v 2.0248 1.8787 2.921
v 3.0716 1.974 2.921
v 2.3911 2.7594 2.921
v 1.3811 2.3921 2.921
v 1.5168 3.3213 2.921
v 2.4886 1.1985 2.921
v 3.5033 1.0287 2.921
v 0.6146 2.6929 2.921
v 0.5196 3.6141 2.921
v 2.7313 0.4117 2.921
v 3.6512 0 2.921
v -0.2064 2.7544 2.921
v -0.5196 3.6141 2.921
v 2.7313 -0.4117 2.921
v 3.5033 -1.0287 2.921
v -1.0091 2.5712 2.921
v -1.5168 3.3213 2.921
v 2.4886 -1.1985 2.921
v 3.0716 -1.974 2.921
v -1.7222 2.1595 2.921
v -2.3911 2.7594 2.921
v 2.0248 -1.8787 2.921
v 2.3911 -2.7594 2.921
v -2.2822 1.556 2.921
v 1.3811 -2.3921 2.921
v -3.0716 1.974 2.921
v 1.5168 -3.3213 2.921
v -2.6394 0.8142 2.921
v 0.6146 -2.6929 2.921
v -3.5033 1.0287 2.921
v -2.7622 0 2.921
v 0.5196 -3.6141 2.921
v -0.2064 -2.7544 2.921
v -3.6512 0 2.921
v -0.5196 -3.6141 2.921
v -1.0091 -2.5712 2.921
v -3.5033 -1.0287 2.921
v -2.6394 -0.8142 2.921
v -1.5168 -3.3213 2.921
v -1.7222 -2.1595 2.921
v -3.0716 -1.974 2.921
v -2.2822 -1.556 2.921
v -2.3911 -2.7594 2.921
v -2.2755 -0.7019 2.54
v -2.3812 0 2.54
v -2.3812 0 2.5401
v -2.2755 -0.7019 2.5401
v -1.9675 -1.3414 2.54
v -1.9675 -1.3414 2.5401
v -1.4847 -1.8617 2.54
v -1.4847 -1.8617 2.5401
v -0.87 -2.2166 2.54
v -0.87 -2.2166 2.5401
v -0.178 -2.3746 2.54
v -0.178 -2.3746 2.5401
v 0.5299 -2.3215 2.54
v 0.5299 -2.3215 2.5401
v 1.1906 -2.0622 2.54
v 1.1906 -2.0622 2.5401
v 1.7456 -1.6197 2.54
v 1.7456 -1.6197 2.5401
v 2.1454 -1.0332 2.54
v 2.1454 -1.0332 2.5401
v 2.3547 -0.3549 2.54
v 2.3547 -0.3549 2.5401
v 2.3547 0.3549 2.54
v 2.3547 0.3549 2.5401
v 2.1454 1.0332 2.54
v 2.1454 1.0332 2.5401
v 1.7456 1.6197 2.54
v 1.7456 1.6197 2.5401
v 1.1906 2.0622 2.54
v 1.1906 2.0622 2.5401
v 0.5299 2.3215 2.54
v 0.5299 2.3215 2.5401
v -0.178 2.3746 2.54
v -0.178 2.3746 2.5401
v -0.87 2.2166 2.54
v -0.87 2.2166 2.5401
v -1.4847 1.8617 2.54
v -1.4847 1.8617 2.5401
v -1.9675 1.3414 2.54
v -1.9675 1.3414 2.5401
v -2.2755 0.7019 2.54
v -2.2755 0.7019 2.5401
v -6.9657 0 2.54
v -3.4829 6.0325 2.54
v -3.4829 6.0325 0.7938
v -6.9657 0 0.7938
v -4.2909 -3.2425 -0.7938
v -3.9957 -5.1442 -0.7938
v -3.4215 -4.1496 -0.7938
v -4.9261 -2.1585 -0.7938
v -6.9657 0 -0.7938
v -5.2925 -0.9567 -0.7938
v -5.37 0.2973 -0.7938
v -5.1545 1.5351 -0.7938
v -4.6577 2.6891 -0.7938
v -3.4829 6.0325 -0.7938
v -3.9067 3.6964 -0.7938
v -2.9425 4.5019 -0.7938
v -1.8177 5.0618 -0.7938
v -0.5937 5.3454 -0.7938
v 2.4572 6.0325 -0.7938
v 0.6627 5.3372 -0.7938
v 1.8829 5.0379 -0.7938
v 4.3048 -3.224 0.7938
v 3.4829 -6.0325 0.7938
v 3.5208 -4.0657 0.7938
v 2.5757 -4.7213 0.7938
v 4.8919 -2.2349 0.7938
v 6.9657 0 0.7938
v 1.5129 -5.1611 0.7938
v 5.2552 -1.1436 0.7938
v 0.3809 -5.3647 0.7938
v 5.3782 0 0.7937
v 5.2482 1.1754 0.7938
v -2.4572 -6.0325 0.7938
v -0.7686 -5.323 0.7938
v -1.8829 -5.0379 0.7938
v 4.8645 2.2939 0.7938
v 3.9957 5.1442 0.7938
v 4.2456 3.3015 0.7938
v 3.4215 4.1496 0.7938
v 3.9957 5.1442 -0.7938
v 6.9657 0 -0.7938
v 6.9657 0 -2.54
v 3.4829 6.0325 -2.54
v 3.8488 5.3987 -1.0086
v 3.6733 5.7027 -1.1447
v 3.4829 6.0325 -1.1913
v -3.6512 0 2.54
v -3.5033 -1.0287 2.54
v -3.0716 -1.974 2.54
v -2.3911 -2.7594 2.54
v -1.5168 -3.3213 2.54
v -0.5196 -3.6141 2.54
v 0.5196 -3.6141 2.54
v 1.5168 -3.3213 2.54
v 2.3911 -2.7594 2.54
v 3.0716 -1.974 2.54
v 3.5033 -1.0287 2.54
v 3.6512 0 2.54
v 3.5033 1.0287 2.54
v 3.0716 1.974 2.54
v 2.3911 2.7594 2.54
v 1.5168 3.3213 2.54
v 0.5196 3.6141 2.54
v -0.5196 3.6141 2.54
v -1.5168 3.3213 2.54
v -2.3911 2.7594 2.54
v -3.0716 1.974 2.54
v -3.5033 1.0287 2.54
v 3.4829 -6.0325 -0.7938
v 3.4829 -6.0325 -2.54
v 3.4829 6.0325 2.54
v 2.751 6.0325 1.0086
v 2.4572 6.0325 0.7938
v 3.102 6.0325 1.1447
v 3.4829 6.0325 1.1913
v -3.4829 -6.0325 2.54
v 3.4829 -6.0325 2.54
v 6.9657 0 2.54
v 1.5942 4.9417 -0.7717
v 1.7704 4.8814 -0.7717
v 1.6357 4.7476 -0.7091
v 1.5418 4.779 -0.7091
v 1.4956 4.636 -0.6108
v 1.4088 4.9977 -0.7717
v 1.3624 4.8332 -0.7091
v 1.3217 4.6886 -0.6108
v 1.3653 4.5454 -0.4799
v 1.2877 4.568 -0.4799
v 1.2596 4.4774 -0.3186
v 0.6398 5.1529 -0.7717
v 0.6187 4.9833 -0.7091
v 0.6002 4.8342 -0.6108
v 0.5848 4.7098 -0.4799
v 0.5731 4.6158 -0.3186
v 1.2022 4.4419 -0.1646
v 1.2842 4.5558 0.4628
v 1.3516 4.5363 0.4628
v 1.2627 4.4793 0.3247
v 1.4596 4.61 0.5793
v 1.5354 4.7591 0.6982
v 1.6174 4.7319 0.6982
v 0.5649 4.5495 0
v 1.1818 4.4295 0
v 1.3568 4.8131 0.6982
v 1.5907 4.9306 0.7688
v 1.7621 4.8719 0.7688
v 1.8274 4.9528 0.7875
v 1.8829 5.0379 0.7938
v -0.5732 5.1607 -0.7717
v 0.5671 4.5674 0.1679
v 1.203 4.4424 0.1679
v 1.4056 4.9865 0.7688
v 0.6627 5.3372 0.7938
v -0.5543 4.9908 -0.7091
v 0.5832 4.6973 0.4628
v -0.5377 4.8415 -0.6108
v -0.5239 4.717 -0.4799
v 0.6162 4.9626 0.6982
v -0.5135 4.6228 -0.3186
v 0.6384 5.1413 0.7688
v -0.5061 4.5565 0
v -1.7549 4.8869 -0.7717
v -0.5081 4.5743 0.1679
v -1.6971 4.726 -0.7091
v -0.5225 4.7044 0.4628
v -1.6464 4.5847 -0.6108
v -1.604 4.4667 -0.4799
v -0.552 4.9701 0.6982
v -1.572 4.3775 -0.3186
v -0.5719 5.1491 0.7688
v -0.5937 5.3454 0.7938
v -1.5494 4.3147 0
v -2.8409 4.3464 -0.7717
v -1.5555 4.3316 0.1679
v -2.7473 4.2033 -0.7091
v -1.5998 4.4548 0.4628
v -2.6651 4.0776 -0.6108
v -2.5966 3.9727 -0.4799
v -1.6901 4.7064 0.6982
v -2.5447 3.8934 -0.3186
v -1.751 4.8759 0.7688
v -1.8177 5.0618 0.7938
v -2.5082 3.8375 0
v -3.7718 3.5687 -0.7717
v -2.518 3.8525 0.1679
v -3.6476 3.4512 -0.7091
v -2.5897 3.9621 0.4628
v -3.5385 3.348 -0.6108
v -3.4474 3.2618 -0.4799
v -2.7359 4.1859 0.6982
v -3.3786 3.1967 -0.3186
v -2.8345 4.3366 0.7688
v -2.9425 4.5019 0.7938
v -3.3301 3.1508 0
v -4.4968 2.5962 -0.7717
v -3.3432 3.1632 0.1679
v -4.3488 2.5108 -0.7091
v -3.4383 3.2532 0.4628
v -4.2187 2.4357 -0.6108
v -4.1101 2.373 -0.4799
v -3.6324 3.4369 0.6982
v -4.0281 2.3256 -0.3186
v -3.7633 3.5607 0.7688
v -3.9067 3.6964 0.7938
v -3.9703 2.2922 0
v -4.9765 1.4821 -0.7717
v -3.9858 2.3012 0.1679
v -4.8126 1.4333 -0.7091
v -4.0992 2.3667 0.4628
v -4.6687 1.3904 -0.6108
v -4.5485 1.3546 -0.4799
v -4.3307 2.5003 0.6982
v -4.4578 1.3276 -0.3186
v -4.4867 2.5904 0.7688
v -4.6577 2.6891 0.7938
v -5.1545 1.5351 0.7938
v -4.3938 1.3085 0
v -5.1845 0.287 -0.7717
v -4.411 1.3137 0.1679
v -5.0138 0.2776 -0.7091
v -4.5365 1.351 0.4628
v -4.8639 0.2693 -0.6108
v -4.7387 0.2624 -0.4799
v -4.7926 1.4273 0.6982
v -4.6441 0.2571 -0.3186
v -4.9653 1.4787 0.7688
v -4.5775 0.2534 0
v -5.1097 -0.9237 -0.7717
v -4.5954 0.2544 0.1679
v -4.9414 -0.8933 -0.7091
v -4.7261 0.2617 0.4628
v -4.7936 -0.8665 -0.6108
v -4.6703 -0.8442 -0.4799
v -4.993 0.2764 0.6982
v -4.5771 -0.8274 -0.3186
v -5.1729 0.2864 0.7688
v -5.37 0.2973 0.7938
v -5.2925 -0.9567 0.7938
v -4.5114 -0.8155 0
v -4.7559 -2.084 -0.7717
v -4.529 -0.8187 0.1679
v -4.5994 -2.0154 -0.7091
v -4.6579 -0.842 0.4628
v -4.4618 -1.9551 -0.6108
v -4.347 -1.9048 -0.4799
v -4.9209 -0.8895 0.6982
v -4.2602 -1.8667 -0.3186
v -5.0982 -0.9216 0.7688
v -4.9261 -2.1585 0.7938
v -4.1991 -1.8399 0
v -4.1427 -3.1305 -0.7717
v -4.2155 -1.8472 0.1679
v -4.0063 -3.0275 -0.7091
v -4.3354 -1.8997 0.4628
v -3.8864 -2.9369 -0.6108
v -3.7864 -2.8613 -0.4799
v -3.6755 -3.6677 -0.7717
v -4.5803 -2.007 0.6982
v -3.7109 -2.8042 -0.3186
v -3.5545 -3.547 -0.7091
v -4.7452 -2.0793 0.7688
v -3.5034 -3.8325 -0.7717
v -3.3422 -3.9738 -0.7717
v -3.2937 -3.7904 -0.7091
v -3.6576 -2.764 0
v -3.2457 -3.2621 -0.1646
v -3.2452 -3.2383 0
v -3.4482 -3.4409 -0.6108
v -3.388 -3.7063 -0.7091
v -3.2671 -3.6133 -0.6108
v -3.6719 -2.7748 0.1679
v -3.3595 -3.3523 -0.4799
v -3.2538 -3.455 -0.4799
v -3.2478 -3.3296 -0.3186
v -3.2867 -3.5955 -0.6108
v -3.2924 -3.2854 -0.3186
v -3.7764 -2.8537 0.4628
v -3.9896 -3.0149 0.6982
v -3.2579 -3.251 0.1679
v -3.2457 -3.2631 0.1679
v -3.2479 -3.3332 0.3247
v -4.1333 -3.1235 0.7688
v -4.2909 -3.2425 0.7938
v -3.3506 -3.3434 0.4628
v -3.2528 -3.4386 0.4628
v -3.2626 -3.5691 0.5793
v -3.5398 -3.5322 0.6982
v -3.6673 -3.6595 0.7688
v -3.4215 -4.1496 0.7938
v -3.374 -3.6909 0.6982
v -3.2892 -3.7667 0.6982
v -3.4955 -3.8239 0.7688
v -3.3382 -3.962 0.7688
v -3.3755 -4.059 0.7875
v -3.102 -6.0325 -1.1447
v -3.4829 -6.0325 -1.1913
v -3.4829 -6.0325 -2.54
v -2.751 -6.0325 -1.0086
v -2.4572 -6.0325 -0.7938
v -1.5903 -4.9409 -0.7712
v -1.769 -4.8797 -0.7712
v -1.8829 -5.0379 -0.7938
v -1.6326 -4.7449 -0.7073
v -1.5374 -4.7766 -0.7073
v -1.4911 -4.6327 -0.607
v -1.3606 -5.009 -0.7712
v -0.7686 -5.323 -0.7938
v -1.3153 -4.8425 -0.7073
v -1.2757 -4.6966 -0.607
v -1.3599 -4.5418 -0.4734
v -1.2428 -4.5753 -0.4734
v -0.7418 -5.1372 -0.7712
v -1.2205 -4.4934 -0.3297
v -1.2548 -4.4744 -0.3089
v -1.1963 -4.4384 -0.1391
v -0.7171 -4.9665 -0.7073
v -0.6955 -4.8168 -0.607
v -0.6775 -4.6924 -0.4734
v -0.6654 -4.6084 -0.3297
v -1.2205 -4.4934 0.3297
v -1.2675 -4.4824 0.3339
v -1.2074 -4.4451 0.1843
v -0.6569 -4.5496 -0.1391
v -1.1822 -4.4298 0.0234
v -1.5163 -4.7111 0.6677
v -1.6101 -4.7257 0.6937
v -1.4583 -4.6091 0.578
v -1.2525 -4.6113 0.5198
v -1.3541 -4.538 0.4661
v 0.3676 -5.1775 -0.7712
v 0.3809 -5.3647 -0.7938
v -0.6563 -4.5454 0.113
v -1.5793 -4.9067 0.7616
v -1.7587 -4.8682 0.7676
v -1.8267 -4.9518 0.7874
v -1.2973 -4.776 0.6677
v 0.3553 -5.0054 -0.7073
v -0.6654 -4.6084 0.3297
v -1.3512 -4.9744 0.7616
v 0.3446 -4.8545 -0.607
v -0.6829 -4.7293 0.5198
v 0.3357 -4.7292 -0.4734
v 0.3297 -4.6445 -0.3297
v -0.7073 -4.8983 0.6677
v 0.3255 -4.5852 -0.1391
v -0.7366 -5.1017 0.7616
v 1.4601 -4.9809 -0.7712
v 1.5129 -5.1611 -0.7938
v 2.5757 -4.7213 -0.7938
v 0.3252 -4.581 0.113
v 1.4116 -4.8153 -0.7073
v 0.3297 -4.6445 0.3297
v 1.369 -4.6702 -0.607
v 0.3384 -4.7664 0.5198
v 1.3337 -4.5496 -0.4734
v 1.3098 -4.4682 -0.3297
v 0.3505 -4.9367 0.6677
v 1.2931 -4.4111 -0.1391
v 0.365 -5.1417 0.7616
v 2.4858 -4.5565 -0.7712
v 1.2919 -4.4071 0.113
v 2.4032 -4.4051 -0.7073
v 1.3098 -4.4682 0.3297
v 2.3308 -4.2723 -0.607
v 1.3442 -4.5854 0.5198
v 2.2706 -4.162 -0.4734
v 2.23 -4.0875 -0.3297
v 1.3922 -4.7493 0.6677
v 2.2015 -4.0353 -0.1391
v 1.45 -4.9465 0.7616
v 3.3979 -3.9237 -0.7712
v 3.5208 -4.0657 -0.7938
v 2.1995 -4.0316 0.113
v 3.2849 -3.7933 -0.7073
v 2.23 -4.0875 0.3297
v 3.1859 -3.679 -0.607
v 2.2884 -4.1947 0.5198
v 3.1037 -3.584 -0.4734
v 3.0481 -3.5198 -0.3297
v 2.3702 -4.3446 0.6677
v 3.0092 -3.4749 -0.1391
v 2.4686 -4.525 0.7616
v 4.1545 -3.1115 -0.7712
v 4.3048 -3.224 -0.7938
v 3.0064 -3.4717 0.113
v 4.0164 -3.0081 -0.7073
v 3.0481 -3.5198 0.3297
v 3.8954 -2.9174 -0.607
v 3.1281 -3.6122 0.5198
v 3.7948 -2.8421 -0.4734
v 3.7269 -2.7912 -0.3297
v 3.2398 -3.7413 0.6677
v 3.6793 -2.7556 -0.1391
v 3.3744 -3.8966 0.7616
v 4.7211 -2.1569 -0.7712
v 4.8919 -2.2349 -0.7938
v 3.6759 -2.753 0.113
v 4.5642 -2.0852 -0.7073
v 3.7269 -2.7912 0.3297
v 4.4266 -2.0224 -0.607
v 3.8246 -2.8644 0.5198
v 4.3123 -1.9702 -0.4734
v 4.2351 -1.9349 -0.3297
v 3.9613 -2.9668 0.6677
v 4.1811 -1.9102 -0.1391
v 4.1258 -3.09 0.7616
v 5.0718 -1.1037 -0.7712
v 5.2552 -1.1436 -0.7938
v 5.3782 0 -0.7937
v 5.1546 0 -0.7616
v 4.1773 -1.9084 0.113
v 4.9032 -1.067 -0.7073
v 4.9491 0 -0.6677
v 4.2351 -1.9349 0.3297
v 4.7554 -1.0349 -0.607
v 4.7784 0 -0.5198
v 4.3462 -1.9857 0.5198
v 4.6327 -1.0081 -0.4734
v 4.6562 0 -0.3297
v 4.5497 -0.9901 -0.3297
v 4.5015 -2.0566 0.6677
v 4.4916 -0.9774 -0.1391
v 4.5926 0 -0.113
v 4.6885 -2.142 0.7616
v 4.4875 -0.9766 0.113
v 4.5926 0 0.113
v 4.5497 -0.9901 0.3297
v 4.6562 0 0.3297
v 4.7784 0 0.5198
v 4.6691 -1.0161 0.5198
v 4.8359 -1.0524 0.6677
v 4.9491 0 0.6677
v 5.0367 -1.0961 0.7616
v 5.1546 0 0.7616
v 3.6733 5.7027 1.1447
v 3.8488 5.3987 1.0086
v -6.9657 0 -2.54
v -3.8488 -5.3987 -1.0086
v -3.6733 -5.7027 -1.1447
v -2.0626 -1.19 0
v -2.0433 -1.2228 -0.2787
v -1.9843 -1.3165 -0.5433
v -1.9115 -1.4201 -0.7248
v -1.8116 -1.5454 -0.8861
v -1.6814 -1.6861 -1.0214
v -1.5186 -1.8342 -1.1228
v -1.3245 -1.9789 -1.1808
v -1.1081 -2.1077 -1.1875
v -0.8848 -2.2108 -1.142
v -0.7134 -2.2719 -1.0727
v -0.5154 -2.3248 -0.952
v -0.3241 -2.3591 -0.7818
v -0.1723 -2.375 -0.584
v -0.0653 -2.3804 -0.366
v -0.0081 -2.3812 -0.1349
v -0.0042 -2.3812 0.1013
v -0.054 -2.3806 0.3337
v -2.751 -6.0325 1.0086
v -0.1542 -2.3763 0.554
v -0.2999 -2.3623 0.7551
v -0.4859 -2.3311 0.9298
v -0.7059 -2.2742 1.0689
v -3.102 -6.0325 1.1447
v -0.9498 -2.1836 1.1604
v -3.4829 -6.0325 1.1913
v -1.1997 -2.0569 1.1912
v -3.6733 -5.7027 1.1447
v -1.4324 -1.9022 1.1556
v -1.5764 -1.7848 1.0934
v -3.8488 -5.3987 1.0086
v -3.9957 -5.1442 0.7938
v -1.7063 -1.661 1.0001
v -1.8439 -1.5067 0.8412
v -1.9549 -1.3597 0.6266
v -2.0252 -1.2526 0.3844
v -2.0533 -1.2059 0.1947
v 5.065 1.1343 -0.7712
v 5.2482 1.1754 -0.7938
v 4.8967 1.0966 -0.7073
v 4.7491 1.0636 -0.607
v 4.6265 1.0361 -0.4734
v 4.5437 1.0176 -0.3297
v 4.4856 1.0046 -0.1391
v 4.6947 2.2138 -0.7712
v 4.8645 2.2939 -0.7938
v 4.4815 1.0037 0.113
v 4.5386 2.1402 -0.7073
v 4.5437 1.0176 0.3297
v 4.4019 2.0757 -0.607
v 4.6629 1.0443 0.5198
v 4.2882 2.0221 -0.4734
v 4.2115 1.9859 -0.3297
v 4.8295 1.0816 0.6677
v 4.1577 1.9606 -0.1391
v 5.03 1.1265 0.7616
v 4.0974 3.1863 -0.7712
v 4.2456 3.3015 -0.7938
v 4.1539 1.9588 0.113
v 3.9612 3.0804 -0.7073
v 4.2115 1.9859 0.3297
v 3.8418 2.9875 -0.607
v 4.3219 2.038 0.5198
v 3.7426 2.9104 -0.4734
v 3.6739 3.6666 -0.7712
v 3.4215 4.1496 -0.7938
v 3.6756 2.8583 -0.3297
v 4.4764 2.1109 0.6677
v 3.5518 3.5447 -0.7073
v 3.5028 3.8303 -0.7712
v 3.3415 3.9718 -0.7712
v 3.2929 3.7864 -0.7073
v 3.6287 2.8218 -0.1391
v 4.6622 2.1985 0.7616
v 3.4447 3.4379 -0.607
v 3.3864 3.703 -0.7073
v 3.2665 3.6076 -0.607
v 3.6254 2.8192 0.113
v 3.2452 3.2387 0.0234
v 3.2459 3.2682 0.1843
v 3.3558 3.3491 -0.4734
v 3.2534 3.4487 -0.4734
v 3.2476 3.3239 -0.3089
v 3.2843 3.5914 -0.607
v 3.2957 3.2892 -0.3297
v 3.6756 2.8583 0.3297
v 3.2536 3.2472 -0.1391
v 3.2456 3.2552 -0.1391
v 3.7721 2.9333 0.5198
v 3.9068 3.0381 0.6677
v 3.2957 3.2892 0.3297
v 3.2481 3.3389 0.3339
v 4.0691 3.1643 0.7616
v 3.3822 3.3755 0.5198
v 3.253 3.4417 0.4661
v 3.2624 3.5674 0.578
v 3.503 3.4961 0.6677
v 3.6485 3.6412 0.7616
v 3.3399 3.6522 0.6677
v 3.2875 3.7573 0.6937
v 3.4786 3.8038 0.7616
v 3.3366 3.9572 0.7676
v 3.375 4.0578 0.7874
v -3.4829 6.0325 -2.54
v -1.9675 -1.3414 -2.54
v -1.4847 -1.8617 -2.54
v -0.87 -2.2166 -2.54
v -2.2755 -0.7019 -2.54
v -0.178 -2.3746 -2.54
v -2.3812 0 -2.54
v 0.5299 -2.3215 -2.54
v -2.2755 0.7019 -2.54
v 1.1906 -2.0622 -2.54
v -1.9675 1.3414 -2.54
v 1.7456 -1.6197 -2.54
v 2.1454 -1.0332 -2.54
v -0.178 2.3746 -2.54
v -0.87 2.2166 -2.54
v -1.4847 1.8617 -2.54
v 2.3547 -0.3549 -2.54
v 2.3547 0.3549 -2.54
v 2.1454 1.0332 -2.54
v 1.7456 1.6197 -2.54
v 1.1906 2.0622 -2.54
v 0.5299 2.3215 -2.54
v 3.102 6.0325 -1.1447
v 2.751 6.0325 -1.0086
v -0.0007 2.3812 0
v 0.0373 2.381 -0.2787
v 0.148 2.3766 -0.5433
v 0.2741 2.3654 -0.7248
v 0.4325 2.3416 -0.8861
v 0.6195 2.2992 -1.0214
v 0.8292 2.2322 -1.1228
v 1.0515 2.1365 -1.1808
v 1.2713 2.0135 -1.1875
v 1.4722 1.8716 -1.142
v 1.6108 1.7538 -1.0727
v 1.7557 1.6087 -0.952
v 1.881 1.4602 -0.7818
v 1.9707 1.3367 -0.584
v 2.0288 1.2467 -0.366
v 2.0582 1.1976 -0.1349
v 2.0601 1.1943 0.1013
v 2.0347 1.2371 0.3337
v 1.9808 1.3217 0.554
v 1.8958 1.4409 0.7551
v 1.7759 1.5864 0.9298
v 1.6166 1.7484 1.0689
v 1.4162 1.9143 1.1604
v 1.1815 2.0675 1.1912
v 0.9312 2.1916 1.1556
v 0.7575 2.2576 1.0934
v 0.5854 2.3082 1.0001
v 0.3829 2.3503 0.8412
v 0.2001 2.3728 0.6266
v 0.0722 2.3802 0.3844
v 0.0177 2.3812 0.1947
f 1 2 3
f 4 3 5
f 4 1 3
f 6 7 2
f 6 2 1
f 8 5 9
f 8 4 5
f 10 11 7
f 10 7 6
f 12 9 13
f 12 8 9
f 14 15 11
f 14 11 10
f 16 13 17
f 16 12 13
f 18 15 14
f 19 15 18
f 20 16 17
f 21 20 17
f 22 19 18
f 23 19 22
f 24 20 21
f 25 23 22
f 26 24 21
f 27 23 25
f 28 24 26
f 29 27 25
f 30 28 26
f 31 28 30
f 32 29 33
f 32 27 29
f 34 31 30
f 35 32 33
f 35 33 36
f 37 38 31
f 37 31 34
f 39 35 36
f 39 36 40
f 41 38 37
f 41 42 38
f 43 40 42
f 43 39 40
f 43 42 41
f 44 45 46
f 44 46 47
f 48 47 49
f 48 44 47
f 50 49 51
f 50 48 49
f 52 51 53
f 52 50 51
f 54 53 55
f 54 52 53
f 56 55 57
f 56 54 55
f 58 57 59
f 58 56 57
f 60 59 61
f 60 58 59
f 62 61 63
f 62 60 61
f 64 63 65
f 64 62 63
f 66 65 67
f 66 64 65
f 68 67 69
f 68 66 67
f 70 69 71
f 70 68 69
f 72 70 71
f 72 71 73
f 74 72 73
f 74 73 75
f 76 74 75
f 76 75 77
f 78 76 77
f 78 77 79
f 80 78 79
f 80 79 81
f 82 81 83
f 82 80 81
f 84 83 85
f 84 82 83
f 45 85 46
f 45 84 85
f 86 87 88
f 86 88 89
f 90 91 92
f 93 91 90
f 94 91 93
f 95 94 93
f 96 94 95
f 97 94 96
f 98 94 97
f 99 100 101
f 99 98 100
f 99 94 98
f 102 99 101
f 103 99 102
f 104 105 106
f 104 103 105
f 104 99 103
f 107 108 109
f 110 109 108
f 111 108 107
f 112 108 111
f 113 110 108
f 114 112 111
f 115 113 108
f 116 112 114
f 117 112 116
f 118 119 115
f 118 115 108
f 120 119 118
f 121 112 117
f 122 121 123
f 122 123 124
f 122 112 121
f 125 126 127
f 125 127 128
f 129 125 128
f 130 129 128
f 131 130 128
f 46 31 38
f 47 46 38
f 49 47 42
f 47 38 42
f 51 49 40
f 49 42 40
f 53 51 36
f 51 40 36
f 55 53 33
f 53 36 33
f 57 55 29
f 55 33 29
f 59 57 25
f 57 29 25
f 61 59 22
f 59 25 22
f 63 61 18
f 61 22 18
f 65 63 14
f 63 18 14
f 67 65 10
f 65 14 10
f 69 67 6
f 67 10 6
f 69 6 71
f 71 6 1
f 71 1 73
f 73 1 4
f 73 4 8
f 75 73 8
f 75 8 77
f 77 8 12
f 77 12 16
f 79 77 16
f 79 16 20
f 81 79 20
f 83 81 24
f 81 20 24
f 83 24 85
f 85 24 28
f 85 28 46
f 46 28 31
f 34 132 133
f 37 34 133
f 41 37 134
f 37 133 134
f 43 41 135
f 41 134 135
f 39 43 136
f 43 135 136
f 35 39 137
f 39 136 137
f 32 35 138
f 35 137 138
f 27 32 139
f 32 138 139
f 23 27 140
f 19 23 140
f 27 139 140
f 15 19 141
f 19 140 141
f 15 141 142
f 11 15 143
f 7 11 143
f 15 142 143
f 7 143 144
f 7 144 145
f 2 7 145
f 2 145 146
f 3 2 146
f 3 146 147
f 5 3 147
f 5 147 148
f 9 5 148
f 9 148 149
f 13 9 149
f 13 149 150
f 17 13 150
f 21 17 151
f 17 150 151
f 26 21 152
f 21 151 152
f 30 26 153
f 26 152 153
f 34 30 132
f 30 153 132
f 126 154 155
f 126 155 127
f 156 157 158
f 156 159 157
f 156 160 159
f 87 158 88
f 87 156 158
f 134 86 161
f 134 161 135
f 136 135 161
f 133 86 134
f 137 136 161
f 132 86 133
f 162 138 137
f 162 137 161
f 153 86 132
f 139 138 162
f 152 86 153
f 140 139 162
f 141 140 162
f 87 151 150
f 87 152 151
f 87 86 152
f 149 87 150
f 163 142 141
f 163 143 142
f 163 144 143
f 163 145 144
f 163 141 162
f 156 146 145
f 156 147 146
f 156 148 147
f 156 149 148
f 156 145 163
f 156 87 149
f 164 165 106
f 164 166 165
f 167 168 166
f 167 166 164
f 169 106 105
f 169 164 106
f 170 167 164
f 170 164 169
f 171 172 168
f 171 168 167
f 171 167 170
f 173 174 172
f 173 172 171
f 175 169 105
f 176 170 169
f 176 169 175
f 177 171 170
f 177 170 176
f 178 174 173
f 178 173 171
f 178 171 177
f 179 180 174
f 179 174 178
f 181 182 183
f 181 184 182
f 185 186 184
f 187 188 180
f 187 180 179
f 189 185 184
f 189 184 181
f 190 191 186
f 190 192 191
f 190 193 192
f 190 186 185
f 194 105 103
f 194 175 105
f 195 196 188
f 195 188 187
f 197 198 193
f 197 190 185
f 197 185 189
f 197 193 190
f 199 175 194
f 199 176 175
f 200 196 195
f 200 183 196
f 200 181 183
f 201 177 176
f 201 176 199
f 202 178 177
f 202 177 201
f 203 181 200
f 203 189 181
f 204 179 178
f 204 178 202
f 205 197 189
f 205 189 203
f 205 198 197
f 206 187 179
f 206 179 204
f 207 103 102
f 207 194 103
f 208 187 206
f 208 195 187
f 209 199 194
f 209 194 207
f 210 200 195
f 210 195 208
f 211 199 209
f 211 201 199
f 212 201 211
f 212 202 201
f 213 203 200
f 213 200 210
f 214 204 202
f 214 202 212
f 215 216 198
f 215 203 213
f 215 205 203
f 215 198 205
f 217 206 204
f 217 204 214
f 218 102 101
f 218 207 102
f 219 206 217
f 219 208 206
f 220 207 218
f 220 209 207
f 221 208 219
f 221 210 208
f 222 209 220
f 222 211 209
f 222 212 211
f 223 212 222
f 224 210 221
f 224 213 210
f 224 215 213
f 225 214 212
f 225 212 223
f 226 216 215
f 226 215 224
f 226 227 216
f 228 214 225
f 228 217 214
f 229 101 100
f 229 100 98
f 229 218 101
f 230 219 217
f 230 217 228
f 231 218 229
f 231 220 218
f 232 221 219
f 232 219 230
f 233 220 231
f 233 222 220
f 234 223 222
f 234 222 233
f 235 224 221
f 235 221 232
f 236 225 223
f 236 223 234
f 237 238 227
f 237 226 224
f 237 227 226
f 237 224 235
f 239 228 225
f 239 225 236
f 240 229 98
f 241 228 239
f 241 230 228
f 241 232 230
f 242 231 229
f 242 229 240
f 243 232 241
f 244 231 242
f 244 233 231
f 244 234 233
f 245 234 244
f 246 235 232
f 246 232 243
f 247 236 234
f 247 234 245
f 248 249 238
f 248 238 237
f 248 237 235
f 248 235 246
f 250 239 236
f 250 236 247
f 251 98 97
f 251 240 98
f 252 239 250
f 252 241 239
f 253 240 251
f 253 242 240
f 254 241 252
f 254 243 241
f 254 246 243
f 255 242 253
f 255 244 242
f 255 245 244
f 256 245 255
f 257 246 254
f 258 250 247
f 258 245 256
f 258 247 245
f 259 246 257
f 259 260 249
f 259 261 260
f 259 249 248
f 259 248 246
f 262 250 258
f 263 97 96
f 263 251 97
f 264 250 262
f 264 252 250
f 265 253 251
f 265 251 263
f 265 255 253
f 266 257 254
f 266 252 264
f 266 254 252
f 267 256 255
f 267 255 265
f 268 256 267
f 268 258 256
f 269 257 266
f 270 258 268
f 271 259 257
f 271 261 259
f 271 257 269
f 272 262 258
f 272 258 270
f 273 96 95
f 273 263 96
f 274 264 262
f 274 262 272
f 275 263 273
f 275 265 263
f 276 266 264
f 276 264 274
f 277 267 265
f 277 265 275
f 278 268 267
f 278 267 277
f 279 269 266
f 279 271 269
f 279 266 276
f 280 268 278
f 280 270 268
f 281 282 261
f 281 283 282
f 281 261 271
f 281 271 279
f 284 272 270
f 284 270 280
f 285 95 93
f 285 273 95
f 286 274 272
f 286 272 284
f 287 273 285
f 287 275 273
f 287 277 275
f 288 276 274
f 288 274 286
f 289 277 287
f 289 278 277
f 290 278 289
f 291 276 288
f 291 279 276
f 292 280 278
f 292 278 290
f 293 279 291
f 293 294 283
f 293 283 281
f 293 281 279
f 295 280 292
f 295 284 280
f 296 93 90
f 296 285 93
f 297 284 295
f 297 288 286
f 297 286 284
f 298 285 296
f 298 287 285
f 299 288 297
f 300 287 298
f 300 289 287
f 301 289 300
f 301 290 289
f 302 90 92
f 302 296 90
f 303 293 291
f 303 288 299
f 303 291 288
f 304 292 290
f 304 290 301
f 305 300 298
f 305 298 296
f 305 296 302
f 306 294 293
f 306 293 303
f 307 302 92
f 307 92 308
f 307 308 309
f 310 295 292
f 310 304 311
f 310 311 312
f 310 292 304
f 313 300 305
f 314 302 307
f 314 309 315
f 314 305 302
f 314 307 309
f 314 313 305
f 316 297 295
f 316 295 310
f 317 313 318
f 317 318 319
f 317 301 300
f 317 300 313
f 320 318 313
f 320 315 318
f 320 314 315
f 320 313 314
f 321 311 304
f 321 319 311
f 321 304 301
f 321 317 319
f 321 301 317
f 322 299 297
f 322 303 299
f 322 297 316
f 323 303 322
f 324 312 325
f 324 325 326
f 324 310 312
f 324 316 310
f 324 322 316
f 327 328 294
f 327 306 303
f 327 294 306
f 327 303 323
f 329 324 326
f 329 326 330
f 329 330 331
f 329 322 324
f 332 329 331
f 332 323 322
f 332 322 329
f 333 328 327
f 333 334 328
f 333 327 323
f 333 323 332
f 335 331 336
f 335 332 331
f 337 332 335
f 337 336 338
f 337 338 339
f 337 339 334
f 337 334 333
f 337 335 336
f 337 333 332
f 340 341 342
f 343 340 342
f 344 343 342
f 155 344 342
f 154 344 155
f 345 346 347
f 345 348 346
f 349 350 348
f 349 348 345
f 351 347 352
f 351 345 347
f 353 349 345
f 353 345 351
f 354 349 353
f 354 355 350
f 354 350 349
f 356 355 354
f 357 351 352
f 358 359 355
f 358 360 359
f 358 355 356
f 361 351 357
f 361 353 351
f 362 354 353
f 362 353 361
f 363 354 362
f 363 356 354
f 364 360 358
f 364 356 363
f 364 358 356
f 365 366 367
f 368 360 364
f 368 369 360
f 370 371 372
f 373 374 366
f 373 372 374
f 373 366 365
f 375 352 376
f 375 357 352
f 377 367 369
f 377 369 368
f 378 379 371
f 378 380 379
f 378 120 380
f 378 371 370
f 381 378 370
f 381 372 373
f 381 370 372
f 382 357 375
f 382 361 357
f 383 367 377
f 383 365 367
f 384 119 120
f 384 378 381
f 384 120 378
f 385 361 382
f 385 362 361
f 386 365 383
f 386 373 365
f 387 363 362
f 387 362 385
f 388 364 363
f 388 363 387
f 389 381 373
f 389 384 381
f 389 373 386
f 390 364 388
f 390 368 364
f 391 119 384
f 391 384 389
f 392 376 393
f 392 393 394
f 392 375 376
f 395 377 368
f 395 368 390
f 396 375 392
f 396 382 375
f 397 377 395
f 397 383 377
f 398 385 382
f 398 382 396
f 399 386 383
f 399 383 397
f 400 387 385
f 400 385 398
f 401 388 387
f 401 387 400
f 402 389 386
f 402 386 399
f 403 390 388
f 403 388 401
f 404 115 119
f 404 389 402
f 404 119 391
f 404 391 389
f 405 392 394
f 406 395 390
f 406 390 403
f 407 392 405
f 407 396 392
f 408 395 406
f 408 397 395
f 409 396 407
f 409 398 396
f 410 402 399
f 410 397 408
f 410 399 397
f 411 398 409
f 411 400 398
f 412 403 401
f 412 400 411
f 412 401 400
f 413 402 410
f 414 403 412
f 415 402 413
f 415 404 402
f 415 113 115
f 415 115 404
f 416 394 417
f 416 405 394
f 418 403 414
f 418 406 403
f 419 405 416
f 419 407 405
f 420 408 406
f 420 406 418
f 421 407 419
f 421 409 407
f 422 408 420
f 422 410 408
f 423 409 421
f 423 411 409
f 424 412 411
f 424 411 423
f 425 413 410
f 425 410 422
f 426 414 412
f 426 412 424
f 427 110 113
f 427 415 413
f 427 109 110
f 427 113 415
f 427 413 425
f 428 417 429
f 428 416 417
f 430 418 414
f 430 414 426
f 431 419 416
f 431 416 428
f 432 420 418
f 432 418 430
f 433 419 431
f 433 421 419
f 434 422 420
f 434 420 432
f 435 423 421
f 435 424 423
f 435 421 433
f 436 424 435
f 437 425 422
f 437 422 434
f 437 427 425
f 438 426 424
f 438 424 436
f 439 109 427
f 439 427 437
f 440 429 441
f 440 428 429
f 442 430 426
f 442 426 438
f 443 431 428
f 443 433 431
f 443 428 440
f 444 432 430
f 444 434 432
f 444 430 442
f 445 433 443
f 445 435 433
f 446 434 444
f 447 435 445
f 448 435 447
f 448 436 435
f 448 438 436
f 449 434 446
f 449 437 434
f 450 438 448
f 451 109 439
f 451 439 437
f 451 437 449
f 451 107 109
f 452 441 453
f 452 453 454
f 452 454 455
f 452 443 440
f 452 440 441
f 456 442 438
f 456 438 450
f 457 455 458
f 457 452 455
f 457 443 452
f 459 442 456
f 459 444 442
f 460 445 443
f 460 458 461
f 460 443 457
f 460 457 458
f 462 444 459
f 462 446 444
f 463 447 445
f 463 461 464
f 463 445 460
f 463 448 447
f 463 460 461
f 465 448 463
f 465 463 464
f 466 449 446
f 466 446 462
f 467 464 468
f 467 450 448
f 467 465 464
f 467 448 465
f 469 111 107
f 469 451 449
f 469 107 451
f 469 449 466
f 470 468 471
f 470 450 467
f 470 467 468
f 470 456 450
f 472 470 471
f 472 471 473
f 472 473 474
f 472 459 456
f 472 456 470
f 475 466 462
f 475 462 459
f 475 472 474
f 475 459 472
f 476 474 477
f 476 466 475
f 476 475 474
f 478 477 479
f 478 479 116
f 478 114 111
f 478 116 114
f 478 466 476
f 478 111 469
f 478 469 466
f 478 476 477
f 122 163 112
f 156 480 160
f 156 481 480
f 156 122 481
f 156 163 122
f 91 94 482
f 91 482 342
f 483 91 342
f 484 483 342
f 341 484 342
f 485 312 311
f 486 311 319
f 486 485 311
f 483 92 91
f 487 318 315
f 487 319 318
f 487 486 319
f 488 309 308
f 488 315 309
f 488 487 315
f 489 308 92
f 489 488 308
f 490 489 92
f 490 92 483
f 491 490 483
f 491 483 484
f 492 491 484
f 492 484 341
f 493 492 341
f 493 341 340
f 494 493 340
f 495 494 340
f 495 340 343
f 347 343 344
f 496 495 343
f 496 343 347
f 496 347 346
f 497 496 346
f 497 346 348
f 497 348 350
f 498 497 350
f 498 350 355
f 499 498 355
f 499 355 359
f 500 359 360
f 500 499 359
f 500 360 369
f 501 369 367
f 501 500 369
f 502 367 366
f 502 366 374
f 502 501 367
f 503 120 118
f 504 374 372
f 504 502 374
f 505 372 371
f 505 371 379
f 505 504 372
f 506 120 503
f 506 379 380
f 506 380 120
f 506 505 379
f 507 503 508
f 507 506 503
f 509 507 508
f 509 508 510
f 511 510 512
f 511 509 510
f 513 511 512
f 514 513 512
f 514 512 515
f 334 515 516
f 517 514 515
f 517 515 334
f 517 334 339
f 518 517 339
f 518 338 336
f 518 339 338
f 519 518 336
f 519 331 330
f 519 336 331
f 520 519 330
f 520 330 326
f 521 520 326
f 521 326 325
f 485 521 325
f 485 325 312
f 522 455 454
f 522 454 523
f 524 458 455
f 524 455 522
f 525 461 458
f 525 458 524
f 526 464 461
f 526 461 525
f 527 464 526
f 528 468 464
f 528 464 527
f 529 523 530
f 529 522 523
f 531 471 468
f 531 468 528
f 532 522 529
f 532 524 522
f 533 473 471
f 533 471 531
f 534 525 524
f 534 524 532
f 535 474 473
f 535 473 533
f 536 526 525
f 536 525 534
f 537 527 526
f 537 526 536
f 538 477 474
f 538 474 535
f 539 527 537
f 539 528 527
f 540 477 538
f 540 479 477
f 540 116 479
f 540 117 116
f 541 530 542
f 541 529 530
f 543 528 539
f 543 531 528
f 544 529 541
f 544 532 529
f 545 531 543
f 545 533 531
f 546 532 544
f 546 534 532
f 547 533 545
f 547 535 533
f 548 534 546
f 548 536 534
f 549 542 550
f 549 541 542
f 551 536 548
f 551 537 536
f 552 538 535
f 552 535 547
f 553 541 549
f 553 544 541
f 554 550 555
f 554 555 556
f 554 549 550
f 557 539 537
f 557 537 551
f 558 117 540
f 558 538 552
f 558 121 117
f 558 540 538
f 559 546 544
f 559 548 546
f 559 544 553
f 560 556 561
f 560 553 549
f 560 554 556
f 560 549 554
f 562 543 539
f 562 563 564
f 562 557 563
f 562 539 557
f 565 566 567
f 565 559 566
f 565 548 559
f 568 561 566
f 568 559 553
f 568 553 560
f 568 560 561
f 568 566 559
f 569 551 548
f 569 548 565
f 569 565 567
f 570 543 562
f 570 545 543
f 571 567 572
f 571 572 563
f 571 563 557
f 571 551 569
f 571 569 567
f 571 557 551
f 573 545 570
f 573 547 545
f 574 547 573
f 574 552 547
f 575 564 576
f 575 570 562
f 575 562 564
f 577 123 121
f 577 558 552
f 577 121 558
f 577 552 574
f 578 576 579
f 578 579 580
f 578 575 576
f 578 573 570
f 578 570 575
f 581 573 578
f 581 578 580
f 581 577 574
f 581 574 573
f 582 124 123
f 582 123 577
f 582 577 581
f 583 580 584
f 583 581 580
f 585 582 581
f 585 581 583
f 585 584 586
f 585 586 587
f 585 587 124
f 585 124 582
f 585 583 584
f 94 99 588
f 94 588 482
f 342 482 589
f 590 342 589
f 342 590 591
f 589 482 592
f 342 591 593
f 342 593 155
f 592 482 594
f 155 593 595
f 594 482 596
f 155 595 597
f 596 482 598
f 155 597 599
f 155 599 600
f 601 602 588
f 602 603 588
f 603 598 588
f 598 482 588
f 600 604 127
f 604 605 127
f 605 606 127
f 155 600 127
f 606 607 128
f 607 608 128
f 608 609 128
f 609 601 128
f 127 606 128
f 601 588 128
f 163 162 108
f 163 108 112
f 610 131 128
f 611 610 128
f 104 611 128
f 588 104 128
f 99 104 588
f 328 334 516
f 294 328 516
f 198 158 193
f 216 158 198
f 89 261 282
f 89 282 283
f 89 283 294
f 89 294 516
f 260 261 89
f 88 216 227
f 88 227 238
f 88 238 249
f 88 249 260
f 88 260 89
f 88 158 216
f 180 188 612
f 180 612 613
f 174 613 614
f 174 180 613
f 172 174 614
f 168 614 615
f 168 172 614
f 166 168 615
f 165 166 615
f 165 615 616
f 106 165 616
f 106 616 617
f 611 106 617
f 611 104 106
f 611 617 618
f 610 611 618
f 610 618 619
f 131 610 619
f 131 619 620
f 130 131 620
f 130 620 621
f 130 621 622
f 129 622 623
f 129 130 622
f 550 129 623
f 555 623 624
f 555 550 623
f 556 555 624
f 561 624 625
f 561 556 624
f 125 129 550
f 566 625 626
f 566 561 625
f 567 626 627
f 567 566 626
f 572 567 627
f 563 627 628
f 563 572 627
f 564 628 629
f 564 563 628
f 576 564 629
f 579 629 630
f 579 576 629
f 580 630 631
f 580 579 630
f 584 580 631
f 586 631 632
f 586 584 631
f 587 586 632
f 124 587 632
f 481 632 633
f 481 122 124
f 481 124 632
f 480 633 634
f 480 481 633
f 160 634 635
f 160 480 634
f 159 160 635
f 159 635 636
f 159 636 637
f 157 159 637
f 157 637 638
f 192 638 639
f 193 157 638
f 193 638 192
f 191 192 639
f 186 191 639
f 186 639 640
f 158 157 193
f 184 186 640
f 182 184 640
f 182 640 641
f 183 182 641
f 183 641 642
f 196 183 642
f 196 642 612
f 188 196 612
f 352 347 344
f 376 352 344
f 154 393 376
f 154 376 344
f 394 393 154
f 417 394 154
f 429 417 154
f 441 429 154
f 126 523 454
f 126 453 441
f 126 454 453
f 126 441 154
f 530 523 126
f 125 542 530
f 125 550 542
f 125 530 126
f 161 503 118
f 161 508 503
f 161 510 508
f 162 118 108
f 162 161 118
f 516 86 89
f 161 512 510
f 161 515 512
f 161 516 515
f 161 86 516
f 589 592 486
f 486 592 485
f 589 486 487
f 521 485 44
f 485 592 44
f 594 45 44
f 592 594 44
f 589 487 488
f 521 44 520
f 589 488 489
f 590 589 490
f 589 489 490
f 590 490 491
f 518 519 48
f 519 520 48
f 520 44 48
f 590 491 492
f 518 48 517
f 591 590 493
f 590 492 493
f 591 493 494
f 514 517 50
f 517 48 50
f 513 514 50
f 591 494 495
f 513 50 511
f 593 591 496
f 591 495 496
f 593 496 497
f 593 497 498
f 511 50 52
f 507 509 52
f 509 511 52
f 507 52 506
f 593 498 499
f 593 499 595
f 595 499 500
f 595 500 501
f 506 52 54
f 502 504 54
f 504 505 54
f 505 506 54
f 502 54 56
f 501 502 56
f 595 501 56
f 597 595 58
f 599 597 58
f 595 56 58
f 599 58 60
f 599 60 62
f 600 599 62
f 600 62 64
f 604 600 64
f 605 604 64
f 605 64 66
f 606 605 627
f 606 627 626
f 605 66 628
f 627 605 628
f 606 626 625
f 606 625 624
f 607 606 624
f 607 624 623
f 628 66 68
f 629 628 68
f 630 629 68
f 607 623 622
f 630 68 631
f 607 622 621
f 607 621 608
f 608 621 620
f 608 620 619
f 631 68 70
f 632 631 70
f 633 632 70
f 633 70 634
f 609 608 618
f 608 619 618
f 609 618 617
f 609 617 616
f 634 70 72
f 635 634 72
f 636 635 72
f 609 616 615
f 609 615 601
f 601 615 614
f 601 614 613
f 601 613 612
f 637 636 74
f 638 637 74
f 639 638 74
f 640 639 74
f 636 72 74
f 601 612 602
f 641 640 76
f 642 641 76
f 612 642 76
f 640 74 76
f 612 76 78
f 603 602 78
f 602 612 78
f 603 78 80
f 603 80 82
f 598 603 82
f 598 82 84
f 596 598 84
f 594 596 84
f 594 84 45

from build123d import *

# Parameters (mm, degrees)
BOSS_EXTRUDE1_DEPTH = 2.54
SKETCH2_R           = 3.65125
SKETCH2_R_2         = 2.38125
BOSS_EXTRUDE2_DEPTH = 0.381
SKETCH3_R           = 2.38125
CUT_EXTRUDE1_DEPTH  = 11.522303198
CHAMFER1_SIZE       = 0.381
SKETCH4_R           = 1.19126
CUT_EXTRUDE2_DEPTH  = 17.225585806


with BuildPart() as part:
    # Sketch1 → Boss-Extrude1 (new, symmetric)
    with BuildSketch(Plane.XY):
        Polygon((3.482865499, 6.0325), (-3.482865499, 6.0325), (-6.965730998, 0), (-3.482865499, -6.0325), (3.482865499, -6.0325), (6.965730998, 0), align=None)
    extrude(amount=BOSS_EXTRUDE1_DEPTH, both=True)

    # Sketch2 → Boss-Extrude2 (add)
    with BuildSketch(Plane.XY.offset(2.54)):
        with Locations(Location((0, 0, 0), (0, 0, 180))):
            Circle(SKETCH2_R)
        with Locations(Location((0, 0, 0), (0, 0, 180))):
            Circle(SKETCH2_R_2, mode=Mode.SUBTRACT)
    extrude(amount=BOSS_EXTRUDE2_DEPTH)

    # Sketch3 → Cut-Extrude1 (cut, through all)
    with BuildSketch(Plane.XY.offset(2.54)):
        with Locations(Location((0, 0, 0), (0, 0, 180))):
            Circle(SKETCH3_R)
    extrude(amount=-CUT_EXTRUDE1_DEPTH, mode=Mode.SUBTRACT)

    # Chamfer1
    chamfer1_edges = [part.edges().sort_by_distance(p)[0] for p in [
        (2.38125, 0, 2.921),
    ]]
    chamfer(chamfer1_edges, length=CHAMFER1_SIZE - 0.0001)  # a hair under: the kernel refuses the full size

    # Sketch4 → Cut-Extrude2 (cut, through all)
    with BuildSketch(Plane(origin=(3.482865499, 6.0325, 0), x_dir=(0, 0, -1), z_dir=(-0.49999999999999944, -0.8660254037844389, 0))):
        with Locations(Location((0, 0, 0), (0, 0, 270))):
            Circle(SKETCH4_R)
    extrude(amount=CUT_EXTRUDE2_DEPTH, mode=Mode.SUBTRACT)

    # Sketch5 → Cut-Revolve1 (revolve, cut)
    with BuildSketch(Plane(origin=(0, 0, 0), x_dir=(0, 0, 1), z_dir=(-0.8660254037844389, 0.4999999999999995, 0)), mode=Mode.PRIVATE) as cut_revolve1_sk:
        with BuildLine():
            Line((-0.79375, 6.965730998), (-0.79375, 5.378230998))
            ThreePointArc((-0.79375, 5.378230998), (0, 4.584480998), (0.79375, 5.378230998))
            Line((0.79375, 5.378230998), (0.79375, 6.965730998))
            Line((0.79375, 6.965730998), (-0.79375, 6.965730998))
        make_face()
    revolve(cut_revolve1_sk.sketch.rotate(Axis((0, 0, -1000.088934232), (0, 0, 1)), 300), axis=Axis((0, 0, -1000.088934232), (0, 0, 1)), mode=Mode.SUBTRACT)


solid = part.part
